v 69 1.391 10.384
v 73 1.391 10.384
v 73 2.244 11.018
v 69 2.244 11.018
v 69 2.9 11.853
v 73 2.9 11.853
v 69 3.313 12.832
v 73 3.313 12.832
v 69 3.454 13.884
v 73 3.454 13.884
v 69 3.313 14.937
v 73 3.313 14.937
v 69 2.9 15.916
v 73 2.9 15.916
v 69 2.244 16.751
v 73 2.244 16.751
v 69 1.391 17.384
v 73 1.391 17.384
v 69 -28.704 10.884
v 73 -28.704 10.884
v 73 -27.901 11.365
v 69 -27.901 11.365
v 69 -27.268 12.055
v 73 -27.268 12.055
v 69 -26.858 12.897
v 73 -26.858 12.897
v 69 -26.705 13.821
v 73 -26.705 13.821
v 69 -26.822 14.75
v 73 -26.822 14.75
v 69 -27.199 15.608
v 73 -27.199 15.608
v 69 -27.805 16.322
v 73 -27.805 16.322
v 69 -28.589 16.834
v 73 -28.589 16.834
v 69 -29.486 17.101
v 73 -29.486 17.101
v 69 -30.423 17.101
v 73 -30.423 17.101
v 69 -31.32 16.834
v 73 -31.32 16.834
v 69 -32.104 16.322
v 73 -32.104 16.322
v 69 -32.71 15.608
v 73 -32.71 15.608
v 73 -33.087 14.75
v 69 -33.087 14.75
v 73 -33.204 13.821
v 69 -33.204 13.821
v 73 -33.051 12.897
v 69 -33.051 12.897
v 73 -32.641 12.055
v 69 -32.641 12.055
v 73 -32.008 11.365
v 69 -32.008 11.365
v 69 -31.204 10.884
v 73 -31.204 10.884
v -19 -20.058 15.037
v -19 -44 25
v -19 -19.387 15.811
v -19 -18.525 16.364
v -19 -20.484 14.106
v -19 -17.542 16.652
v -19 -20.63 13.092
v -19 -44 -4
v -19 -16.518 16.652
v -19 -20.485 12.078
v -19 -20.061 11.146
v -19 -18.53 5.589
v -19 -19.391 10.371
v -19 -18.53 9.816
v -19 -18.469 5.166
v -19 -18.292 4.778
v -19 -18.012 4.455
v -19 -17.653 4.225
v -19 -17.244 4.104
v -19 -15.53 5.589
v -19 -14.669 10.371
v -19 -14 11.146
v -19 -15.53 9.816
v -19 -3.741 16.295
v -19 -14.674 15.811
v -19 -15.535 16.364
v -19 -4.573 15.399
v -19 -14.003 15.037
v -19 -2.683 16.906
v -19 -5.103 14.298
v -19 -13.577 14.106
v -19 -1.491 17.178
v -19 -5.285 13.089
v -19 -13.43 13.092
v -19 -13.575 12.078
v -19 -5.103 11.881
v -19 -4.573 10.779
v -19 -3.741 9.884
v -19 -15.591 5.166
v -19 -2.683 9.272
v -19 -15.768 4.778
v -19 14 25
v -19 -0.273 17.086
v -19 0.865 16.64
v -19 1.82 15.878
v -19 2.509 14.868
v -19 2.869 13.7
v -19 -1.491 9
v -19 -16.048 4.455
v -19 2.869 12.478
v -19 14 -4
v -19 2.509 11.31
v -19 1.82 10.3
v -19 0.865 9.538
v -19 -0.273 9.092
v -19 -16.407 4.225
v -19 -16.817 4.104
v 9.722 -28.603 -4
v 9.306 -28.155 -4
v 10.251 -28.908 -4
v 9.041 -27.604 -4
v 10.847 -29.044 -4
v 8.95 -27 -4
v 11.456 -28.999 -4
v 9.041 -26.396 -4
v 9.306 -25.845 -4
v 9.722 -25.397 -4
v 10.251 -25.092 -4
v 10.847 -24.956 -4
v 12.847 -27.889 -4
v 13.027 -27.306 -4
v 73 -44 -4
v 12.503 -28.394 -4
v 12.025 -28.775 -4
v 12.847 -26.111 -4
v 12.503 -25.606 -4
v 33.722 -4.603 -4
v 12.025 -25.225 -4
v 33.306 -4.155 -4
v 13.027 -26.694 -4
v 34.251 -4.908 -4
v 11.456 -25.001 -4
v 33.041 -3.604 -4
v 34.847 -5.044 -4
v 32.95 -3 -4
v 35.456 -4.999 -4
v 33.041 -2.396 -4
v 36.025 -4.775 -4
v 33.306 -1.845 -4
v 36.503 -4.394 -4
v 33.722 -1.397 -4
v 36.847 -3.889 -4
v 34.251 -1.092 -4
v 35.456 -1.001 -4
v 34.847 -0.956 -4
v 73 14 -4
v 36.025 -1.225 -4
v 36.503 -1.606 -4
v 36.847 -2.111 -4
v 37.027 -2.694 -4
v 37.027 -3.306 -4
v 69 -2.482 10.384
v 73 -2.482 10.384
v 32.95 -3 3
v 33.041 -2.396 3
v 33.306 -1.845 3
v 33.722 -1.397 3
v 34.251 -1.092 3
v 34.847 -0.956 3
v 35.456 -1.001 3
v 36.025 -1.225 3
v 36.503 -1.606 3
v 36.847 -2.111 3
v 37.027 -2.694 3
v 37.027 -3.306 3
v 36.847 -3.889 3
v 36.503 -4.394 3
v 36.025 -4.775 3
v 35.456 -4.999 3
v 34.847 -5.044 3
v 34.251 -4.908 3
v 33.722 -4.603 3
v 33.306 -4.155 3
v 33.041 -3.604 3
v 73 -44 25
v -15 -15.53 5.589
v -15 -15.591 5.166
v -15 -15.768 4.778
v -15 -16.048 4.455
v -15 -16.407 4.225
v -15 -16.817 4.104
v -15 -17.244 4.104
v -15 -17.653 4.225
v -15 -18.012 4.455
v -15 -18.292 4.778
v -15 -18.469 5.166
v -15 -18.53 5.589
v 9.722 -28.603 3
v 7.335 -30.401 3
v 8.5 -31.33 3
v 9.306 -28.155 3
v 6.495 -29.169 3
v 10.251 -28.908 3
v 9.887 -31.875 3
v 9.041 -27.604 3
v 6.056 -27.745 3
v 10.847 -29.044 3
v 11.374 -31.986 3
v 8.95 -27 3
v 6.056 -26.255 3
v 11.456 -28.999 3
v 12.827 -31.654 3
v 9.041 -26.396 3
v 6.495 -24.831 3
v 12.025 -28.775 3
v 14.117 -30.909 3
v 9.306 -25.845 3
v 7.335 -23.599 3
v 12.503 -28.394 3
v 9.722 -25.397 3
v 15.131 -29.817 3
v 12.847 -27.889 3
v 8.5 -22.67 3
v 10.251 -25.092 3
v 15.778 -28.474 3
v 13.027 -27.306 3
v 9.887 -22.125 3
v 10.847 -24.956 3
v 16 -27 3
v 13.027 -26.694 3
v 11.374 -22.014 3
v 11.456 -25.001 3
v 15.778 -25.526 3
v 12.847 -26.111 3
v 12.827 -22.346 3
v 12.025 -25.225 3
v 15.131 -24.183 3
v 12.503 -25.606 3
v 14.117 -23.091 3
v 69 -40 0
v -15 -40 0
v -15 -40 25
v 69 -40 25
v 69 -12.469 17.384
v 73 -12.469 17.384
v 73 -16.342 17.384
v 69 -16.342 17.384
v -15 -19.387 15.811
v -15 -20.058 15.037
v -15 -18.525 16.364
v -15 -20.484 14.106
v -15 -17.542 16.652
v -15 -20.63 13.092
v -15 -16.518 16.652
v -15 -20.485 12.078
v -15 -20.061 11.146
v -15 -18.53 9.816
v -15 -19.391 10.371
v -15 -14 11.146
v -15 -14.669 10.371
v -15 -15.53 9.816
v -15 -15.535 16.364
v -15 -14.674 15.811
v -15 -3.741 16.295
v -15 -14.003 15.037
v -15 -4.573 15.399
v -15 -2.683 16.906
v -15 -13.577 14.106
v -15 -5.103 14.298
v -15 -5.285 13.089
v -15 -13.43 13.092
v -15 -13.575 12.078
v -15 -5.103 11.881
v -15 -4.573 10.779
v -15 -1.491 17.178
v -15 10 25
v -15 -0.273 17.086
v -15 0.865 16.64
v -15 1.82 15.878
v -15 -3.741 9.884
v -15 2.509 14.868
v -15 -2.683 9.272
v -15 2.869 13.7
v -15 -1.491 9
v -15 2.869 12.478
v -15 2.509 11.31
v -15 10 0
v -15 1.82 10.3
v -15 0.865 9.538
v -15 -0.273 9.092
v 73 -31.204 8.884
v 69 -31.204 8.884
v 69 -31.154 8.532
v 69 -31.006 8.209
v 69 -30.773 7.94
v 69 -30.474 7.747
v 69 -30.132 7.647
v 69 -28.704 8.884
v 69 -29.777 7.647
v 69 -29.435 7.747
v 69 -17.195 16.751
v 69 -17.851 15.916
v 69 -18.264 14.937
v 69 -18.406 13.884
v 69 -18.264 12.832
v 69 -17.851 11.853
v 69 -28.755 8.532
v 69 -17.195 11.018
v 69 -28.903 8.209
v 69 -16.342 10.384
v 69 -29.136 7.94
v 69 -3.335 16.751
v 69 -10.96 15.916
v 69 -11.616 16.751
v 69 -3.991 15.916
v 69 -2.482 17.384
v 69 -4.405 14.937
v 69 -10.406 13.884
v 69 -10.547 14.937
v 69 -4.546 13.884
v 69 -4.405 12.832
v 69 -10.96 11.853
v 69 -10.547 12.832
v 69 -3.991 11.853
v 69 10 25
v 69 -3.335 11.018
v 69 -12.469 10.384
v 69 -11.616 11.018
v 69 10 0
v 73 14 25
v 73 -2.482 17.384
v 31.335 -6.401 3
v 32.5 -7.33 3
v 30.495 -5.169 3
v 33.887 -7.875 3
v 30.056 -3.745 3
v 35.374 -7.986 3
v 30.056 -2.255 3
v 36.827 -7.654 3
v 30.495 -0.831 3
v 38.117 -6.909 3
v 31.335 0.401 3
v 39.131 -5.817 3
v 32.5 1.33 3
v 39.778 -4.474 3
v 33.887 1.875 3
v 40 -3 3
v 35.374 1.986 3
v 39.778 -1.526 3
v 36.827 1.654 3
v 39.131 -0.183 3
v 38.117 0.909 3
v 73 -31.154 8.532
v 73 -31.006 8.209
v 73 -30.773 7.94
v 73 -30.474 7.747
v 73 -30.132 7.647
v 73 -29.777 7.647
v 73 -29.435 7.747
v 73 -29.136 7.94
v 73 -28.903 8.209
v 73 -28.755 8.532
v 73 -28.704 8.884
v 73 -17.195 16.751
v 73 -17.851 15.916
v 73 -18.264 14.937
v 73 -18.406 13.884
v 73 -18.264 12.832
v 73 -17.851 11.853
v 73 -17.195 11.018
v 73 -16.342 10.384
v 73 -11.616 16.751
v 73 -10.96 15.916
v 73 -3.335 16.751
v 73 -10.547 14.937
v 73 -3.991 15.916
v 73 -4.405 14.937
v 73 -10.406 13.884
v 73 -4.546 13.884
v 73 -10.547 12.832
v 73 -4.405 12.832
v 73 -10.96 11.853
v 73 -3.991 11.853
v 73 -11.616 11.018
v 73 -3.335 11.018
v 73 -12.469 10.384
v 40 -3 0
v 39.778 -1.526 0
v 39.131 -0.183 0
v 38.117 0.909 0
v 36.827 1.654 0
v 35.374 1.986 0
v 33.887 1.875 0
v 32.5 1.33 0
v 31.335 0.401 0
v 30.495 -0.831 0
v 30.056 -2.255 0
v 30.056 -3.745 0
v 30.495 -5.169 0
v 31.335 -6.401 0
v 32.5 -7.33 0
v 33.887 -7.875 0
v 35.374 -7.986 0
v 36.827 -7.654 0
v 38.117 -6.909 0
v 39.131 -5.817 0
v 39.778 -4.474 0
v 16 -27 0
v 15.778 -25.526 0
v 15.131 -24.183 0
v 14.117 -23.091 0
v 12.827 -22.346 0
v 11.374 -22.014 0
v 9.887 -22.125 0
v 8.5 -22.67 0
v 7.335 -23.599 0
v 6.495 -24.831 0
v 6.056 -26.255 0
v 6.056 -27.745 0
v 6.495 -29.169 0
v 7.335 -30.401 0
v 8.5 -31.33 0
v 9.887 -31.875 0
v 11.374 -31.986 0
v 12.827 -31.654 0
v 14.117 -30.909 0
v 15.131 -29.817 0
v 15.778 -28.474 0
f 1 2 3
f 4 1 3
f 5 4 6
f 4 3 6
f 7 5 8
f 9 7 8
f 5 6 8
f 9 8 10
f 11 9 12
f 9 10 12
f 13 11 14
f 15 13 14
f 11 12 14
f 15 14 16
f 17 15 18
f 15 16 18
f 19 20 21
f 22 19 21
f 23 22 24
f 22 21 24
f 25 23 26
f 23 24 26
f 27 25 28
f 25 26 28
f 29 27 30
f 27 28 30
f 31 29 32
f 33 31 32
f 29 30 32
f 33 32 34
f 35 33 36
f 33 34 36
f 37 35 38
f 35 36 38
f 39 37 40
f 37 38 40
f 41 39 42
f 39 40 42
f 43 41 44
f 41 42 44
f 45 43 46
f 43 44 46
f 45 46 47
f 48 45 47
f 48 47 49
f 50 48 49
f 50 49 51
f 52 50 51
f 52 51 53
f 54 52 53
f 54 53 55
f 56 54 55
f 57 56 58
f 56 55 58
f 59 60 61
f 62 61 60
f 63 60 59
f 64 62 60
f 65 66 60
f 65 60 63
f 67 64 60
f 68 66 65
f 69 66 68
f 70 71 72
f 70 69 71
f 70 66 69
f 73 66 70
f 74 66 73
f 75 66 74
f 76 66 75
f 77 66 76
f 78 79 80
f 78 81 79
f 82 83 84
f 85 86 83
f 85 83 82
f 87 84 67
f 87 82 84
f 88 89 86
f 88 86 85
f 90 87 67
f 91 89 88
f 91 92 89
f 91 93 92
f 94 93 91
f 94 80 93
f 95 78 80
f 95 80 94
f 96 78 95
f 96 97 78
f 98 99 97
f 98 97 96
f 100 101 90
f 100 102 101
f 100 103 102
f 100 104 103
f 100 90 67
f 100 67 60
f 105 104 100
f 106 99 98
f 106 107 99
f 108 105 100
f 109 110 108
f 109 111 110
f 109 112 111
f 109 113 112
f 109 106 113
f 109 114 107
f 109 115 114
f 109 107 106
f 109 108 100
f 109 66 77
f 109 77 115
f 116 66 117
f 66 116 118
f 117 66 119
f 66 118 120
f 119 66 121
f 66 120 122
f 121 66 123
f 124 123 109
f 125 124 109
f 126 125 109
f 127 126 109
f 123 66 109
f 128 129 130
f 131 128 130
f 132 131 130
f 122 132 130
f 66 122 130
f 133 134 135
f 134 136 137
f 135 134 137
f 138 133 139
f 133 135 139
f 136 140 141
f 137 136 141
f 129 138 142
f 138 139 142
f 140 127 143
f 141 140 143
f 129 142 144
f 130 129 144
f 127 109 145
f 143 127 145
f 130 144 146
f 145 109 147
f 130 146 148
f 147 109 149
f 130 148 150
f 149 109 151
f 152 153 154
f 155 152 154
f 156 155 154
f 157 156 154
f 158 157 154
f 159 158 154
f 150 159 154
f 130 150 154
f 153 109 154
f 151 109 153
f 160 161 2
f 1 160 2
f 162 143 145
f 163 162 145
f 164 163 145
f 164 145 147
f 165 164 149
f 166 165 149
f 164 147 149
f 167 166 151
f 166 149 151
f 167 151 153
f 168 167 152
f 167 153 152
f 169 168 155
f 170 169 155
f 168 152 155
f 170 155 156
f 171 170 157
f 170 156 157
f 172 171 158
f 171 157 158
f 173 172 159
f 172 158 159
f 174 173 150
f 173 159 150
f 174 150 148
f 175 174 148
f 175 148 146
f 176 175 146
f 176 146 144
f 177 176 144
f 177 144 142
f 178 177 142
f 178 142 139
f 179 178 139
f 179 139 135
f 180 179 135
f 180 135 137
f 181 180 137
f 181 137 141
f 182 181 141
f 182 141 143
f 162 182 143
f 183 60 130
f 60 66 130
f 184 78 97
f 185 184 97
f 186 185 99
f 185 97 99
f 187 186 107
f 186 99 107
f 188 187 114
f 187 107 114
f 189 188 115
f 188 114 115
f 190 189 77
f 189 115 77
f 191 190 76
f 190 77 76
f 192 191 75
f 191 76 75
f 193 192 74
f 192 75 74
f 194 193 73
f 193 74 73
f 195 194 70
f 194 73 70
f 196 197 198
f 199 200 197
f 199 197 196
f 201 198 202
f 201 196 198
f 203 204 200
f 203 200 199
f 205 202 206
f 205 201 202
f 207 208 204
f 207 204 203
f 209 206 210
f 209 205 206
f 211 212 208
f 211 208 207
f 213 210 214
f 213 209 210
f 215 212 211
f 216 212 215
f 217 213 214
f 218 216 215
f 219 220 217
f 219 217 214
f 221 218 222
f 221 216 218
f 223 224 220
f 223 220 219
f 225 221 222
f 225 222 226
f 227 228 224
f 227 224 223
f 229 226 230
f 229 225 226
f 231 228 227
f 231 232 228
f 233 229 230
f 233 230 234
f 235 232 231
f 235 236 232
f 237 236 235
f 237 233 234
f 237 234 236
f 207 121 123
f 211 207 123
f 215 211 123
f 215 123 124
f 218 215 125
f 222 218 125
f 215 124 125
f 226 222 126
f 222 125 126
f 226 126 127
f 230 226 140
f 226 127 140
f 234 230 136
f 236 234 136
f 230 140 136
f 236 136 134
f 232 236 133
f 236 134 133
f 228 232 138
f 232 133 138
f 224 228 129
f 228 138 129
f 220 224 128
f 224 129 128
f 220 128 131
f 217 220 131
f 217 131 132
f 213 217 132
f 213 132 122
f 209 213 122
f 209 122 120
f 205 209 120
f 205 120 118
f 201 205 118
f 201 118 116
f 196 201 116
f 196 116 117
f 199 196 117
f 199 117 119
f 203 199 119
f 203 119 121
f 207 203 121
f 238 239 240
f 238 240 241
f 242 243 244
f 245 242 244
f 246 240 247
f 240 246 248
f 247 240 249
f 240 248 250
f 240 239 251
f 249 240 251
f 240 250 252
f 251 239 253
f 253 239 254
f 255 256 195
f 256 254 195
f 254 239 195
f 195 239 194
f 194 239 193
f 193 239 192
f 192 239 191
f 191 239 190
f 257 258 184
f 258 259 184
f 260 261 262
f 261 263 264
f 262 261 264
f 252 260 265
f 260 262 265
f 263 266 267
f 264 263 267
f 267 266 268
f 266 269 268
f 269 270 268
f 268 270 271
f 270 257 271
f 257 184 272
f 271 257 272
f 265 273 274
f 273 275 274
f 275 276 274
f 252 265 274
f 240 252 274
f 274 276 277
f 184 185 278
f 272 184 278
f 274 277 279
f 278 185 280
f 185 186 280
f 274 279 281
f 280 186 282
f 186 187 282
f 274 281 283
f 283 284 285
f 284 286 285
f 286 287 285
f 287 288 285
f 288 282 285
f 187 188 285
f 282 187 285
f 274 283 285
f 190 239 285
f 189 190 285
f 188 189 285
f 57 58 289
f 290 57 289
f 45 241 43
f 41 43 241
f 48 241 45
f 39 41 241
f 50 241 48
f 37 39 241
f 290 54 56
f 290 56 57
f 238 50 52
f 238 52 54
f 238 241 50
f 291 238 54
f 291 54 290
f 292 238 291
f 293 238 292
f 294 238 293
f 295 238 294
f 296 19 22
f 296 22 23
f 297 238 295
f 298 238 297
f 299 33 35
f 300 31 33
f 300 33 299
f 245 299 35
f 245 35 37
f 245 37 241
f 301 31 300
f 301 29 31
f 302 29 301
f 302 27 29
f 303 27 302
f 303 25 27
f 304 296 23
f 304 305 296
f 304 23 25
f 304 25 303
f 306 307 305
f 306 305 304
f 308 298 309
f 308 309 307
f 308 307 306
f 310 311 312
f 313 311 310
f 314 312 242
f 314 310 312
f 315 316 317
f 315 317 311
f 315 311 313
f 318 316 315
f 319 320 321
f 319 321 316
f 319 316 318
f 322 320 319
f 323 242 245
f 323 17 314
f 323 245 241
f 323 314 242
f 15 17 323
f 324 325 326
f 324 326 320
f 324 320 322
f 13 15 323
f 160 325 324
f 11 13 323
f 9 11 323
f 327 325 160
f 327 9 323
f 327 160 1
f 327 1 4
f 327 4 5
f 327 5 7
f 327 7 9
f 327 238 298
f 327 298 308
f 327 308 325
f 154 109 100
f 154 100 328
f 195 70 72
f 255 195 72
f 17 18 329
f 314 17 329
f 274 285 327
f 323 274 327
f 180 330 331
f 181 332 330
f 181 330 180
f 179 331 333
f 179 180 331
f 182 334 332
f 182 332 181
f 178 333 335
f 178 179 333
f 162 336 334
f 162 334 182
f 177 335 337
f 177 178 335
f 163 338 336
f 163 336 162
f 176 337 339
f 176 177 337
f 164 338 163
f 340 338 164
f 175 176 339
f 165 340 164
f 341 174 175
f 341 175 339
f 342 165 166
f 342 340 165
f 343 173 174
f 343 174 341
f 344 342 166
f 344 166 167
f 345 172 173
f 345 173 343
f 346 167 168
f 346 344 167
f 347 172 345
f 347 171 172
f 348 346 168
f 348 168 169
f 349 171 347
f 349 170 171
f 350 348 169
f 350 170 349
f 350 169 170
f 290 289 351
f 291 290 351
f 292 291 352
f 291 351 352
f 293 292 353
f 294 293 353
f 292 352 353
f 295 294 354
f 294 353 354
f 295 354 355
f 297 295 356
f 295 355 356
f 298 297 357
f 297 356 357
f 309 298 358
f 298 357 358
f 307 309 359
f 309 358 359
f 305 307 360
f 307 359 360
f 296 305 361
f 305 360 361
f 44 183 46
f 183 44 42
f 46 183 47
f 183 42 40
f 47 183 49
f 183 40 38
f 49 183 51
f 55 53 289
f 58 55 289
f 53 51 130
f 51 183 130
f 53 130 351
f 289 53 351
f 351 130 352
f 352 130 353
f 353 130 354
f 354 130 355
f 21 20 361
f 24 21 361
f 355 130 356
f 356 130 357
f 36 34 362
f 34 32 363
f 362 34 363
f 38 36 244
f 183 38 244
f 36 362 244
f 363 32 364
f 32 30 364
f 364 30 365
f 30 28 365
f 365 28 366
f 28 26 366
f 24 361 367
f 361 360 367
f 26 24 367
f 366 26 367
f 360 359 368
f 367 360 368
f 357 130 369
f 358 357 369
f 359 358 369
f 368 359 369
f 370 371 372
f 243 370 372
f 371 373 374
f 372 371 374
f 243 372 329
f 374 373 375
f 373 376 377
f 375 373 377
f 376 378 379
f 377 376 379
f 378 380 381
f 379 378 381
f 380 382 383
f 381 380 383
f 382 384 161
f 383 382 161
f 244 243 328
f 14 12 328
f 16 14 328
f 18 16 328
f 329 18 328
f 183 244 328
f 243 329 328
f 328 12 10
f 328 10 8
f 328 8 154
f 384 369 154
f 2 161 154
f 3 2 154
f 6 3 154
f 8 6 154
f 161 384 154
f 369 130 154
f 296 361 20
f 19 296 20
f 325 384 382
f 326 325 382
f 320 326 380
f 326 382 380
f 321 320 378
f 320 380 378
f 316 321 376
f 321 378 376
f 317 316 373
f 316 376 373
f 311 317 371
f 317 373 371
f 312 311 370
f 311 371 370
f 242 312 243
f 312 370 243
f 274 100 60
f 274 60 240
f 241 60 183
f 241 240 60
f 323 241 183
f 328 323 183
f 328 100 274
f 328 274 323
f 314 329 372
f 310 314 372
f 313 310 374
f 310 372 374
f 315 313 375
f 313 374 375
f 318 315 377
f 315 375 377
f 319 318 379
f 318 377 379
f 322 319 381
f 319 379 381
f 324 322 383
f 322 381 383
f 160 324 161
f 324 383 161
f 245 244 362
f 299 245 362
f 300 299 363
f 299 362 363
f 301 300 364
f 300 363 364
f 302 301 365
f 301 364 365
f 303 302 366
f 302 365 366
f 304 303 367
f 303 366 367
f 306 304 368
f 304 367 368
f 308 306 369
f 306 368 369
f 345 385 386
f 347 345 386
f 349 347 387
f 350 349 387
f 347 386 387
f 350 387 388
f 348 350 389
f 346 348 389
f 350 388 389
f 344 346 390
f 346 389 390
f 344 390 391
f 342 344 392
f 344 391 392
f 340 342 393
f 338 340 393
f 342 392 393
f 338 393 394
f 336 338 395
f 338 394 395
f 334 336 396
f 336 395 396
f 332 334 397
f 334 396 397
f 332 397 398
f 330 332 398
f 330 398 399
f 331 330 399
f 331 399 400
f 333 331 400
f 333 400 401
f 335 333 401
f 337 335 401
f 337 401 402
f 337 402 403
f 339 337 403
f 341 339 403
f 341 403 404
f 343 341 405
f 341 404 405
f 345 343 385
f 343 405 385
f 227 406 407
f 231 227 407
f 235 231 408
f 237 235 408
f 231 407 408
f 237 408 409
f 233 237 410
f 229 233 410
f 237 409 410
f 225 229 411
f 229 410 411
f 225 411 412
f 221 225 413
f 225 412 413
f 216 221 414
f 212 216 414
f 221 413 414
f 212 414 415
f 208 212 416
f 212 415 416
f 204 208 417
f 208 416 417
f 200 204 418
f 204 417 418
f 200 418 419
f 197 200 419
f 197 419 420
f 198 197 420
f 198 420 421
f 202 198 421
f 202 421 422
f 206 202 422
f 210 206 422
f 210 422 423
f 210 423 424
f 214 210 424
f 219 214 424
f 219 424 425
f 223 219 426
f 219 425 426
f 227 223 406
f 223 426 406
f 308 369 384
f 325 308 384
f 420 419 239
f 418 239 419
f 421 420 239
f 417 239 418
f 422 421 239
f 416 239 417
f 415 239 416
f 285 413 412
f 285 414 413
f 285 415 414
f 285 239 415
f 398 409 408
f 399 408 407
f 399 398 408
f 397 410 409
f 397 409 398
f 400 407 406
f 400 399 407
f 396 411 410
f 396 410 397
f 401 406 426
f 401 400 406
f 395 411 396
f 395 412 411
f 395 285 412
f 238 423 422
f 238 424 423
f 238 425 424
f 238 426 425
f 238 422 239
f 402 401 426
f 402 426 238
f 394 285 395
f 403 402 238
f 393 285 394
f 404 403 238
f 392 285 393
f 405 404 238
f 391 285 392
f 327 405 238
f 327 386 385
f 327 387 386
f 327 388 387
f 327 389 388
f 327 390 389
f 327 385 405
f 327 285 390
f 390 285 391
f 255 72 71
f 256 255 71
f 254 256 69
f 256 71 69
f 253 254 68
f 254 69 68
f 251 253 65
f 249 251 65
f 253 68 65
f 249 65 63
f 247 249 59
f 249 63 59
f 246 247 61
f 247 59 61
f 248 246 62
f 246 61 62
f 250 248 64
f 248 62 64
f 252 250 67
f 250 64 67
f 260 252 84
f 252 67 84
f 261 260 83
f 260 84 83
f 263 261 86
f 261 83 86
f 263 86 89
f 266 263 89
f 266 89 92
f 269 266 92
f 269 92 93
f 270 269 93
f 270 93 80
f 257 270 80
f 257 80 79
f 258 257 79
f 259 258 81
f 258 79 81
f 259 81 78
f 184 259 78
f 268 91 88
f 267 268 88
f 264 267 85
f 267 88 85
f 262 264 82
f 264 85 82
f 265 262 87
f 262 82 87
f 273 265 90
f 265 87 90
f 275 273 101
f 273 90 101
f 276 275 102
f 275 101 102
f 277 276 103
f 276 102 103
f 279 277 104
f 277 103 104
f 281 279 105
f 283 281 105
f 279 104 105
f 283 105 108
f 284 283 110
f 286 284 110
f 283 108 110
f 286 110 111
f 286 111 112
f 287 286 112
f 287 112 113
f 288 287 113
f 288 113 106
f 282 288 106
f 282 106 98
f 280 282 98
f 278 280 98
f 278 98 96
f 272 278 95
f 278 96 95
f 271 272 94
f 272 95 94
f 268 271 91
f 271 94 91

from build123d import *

# Parameters (mm, degrees)
F0_W     = 92
F0_H     = 58
F0_W_2   = 84
F0_H_2   = 50
F0_R     = 5
F1_DEPTH = 4
F2_DEPTH = 25
F3_DEPTH = 3
F5_DEPTH = 4
F6_R     = 4.1
F7_DEPTH = 4
F9_D     = 4.1


with BuildPart() as f1:
    # F0 (on Top) → F1 (new body)
    with BuildSketch(Plane.XY):
        with Locations((27, -15)):
            Rectangle(F0_W, F0_H)
        with Locations((27, -15)):
            Rectangle(F0_W_2, F0_H_2, mode=Mode.SUBTRACT)
        with Locations((27, -15)):
            Rectangle(F0_W_2, F0_H_2)
        with Locations((11, -27)):
            Circle(F0_R, mode=Mode.SUBTRACT)
        with Locations((35, -3)):
            Circle(F0_R, mode=Mode.SUBTRACT)
        with Locations((11, -27)):
            Circle(F0_R)
        with Locations((35, -3)):
            Circle(F0_R)
    extrude(amount=-F1_DEPTH)

    # F0 (on Top) → F2 (join)
    with BuildSketch(Plane.XY):
        with Locations((27, -15)):
            Rectangle(F0_W, F0_H)
        with Locations((27, -15)):
            Rectangle(F0_W_2, F0_H_2, mode=Mode.SUBTRACT)
    extrude(amount=F2_DEPTH)

    # F0 (on Top) → F3 (join)
    with BuildSketch(Plane.XY):
        with Locations((35, -3)):
            Circle(F0_R)
        with Locations((11, -27)):
            Circle(F0_R)
    extrude(amount=F3_DEPTH)

    # F4 (on face) → F5 (cut, through all)
    with BuildSketch(Plane.YZ.offset(73)):
        with BuildLine():
            Line((-28.704477, 8.884444), (-28.704477, 10.884444))
            ThreePointArc((-28.704477, 10.884444), (-29.954477, 17.134444), (-31.204477, 10.884444))
            Line((-31.204477, 10.884444), (-31.204477, 8.884444))
            ThreePointArc((-31.204477, 8.884444), (-29.954477, 7.634444), (-28.704477, 8.884444))
        make_face()
        with BuildLine():
            Line((-12.469048, 17.384444), (-16.342031, 17.384444))
            ThreePointArc((-16.342031, 17.384444), (-18.40554, 13.884444), (-16.342031, 10.384444))
            Line((-16.342031, 10.384444), (-12.469048, 10.384444))
            ThreePointArc((-12.469048, 10.384444), (-10.40554, 13.884444), (-12.469048, 17.384444))
        make_face()
        with BuildLine():
            Line((-2.4822, 10.384444), (1.390783, 10.384444))
            ThreePointArc((1.390783, 10.384444), (3.454292, 13.884444), (1.390783, 17.384444))
            Line((1.390783, 17.384444), (-2.4822, 17.384444))
            ThreePointArc((-2.4822, 17.384444), (-4.545708, 13.884444), (-2.4822, 10.384444))
        make_face()
    extrude(amount=-F5_DEPTH, mode=Mode.SUBTRACT)

    # F6 (on face) → F7 (cut, through all)
    with BuildSketch(Plane(origin=(-19, 0, 0), x_dir=(0, -1, 0), z_dir=(-1, 0, 0))):
        with Locations((1.185031, 13.089023)):
            Circle(F6_R)
        with BuildLine():
            Line((18.530197, 5.589023), (18.530197, 9.816409))
            ThreePointArc((18.530197, 9.816409), (17.030197, 16.689023), (15.530197, 9.816409))
            Line((15.530197, 9.816409), (15.530197, 5.589023))
            ThreePointArc((15.530197, 5.589023), (17.030197, 4.089023), (18.530197, 5.589023))
        make_face()
    extrude(amount=-F7_DEPTH, mode=Mode.SUBTRACT)

    # F9 (through all)
    with Locations(Plane.XY.offset(3)):
        with Locations((35, -3), (11, -27)):
            Hole(F9_D / 2)


solid = f1.part
